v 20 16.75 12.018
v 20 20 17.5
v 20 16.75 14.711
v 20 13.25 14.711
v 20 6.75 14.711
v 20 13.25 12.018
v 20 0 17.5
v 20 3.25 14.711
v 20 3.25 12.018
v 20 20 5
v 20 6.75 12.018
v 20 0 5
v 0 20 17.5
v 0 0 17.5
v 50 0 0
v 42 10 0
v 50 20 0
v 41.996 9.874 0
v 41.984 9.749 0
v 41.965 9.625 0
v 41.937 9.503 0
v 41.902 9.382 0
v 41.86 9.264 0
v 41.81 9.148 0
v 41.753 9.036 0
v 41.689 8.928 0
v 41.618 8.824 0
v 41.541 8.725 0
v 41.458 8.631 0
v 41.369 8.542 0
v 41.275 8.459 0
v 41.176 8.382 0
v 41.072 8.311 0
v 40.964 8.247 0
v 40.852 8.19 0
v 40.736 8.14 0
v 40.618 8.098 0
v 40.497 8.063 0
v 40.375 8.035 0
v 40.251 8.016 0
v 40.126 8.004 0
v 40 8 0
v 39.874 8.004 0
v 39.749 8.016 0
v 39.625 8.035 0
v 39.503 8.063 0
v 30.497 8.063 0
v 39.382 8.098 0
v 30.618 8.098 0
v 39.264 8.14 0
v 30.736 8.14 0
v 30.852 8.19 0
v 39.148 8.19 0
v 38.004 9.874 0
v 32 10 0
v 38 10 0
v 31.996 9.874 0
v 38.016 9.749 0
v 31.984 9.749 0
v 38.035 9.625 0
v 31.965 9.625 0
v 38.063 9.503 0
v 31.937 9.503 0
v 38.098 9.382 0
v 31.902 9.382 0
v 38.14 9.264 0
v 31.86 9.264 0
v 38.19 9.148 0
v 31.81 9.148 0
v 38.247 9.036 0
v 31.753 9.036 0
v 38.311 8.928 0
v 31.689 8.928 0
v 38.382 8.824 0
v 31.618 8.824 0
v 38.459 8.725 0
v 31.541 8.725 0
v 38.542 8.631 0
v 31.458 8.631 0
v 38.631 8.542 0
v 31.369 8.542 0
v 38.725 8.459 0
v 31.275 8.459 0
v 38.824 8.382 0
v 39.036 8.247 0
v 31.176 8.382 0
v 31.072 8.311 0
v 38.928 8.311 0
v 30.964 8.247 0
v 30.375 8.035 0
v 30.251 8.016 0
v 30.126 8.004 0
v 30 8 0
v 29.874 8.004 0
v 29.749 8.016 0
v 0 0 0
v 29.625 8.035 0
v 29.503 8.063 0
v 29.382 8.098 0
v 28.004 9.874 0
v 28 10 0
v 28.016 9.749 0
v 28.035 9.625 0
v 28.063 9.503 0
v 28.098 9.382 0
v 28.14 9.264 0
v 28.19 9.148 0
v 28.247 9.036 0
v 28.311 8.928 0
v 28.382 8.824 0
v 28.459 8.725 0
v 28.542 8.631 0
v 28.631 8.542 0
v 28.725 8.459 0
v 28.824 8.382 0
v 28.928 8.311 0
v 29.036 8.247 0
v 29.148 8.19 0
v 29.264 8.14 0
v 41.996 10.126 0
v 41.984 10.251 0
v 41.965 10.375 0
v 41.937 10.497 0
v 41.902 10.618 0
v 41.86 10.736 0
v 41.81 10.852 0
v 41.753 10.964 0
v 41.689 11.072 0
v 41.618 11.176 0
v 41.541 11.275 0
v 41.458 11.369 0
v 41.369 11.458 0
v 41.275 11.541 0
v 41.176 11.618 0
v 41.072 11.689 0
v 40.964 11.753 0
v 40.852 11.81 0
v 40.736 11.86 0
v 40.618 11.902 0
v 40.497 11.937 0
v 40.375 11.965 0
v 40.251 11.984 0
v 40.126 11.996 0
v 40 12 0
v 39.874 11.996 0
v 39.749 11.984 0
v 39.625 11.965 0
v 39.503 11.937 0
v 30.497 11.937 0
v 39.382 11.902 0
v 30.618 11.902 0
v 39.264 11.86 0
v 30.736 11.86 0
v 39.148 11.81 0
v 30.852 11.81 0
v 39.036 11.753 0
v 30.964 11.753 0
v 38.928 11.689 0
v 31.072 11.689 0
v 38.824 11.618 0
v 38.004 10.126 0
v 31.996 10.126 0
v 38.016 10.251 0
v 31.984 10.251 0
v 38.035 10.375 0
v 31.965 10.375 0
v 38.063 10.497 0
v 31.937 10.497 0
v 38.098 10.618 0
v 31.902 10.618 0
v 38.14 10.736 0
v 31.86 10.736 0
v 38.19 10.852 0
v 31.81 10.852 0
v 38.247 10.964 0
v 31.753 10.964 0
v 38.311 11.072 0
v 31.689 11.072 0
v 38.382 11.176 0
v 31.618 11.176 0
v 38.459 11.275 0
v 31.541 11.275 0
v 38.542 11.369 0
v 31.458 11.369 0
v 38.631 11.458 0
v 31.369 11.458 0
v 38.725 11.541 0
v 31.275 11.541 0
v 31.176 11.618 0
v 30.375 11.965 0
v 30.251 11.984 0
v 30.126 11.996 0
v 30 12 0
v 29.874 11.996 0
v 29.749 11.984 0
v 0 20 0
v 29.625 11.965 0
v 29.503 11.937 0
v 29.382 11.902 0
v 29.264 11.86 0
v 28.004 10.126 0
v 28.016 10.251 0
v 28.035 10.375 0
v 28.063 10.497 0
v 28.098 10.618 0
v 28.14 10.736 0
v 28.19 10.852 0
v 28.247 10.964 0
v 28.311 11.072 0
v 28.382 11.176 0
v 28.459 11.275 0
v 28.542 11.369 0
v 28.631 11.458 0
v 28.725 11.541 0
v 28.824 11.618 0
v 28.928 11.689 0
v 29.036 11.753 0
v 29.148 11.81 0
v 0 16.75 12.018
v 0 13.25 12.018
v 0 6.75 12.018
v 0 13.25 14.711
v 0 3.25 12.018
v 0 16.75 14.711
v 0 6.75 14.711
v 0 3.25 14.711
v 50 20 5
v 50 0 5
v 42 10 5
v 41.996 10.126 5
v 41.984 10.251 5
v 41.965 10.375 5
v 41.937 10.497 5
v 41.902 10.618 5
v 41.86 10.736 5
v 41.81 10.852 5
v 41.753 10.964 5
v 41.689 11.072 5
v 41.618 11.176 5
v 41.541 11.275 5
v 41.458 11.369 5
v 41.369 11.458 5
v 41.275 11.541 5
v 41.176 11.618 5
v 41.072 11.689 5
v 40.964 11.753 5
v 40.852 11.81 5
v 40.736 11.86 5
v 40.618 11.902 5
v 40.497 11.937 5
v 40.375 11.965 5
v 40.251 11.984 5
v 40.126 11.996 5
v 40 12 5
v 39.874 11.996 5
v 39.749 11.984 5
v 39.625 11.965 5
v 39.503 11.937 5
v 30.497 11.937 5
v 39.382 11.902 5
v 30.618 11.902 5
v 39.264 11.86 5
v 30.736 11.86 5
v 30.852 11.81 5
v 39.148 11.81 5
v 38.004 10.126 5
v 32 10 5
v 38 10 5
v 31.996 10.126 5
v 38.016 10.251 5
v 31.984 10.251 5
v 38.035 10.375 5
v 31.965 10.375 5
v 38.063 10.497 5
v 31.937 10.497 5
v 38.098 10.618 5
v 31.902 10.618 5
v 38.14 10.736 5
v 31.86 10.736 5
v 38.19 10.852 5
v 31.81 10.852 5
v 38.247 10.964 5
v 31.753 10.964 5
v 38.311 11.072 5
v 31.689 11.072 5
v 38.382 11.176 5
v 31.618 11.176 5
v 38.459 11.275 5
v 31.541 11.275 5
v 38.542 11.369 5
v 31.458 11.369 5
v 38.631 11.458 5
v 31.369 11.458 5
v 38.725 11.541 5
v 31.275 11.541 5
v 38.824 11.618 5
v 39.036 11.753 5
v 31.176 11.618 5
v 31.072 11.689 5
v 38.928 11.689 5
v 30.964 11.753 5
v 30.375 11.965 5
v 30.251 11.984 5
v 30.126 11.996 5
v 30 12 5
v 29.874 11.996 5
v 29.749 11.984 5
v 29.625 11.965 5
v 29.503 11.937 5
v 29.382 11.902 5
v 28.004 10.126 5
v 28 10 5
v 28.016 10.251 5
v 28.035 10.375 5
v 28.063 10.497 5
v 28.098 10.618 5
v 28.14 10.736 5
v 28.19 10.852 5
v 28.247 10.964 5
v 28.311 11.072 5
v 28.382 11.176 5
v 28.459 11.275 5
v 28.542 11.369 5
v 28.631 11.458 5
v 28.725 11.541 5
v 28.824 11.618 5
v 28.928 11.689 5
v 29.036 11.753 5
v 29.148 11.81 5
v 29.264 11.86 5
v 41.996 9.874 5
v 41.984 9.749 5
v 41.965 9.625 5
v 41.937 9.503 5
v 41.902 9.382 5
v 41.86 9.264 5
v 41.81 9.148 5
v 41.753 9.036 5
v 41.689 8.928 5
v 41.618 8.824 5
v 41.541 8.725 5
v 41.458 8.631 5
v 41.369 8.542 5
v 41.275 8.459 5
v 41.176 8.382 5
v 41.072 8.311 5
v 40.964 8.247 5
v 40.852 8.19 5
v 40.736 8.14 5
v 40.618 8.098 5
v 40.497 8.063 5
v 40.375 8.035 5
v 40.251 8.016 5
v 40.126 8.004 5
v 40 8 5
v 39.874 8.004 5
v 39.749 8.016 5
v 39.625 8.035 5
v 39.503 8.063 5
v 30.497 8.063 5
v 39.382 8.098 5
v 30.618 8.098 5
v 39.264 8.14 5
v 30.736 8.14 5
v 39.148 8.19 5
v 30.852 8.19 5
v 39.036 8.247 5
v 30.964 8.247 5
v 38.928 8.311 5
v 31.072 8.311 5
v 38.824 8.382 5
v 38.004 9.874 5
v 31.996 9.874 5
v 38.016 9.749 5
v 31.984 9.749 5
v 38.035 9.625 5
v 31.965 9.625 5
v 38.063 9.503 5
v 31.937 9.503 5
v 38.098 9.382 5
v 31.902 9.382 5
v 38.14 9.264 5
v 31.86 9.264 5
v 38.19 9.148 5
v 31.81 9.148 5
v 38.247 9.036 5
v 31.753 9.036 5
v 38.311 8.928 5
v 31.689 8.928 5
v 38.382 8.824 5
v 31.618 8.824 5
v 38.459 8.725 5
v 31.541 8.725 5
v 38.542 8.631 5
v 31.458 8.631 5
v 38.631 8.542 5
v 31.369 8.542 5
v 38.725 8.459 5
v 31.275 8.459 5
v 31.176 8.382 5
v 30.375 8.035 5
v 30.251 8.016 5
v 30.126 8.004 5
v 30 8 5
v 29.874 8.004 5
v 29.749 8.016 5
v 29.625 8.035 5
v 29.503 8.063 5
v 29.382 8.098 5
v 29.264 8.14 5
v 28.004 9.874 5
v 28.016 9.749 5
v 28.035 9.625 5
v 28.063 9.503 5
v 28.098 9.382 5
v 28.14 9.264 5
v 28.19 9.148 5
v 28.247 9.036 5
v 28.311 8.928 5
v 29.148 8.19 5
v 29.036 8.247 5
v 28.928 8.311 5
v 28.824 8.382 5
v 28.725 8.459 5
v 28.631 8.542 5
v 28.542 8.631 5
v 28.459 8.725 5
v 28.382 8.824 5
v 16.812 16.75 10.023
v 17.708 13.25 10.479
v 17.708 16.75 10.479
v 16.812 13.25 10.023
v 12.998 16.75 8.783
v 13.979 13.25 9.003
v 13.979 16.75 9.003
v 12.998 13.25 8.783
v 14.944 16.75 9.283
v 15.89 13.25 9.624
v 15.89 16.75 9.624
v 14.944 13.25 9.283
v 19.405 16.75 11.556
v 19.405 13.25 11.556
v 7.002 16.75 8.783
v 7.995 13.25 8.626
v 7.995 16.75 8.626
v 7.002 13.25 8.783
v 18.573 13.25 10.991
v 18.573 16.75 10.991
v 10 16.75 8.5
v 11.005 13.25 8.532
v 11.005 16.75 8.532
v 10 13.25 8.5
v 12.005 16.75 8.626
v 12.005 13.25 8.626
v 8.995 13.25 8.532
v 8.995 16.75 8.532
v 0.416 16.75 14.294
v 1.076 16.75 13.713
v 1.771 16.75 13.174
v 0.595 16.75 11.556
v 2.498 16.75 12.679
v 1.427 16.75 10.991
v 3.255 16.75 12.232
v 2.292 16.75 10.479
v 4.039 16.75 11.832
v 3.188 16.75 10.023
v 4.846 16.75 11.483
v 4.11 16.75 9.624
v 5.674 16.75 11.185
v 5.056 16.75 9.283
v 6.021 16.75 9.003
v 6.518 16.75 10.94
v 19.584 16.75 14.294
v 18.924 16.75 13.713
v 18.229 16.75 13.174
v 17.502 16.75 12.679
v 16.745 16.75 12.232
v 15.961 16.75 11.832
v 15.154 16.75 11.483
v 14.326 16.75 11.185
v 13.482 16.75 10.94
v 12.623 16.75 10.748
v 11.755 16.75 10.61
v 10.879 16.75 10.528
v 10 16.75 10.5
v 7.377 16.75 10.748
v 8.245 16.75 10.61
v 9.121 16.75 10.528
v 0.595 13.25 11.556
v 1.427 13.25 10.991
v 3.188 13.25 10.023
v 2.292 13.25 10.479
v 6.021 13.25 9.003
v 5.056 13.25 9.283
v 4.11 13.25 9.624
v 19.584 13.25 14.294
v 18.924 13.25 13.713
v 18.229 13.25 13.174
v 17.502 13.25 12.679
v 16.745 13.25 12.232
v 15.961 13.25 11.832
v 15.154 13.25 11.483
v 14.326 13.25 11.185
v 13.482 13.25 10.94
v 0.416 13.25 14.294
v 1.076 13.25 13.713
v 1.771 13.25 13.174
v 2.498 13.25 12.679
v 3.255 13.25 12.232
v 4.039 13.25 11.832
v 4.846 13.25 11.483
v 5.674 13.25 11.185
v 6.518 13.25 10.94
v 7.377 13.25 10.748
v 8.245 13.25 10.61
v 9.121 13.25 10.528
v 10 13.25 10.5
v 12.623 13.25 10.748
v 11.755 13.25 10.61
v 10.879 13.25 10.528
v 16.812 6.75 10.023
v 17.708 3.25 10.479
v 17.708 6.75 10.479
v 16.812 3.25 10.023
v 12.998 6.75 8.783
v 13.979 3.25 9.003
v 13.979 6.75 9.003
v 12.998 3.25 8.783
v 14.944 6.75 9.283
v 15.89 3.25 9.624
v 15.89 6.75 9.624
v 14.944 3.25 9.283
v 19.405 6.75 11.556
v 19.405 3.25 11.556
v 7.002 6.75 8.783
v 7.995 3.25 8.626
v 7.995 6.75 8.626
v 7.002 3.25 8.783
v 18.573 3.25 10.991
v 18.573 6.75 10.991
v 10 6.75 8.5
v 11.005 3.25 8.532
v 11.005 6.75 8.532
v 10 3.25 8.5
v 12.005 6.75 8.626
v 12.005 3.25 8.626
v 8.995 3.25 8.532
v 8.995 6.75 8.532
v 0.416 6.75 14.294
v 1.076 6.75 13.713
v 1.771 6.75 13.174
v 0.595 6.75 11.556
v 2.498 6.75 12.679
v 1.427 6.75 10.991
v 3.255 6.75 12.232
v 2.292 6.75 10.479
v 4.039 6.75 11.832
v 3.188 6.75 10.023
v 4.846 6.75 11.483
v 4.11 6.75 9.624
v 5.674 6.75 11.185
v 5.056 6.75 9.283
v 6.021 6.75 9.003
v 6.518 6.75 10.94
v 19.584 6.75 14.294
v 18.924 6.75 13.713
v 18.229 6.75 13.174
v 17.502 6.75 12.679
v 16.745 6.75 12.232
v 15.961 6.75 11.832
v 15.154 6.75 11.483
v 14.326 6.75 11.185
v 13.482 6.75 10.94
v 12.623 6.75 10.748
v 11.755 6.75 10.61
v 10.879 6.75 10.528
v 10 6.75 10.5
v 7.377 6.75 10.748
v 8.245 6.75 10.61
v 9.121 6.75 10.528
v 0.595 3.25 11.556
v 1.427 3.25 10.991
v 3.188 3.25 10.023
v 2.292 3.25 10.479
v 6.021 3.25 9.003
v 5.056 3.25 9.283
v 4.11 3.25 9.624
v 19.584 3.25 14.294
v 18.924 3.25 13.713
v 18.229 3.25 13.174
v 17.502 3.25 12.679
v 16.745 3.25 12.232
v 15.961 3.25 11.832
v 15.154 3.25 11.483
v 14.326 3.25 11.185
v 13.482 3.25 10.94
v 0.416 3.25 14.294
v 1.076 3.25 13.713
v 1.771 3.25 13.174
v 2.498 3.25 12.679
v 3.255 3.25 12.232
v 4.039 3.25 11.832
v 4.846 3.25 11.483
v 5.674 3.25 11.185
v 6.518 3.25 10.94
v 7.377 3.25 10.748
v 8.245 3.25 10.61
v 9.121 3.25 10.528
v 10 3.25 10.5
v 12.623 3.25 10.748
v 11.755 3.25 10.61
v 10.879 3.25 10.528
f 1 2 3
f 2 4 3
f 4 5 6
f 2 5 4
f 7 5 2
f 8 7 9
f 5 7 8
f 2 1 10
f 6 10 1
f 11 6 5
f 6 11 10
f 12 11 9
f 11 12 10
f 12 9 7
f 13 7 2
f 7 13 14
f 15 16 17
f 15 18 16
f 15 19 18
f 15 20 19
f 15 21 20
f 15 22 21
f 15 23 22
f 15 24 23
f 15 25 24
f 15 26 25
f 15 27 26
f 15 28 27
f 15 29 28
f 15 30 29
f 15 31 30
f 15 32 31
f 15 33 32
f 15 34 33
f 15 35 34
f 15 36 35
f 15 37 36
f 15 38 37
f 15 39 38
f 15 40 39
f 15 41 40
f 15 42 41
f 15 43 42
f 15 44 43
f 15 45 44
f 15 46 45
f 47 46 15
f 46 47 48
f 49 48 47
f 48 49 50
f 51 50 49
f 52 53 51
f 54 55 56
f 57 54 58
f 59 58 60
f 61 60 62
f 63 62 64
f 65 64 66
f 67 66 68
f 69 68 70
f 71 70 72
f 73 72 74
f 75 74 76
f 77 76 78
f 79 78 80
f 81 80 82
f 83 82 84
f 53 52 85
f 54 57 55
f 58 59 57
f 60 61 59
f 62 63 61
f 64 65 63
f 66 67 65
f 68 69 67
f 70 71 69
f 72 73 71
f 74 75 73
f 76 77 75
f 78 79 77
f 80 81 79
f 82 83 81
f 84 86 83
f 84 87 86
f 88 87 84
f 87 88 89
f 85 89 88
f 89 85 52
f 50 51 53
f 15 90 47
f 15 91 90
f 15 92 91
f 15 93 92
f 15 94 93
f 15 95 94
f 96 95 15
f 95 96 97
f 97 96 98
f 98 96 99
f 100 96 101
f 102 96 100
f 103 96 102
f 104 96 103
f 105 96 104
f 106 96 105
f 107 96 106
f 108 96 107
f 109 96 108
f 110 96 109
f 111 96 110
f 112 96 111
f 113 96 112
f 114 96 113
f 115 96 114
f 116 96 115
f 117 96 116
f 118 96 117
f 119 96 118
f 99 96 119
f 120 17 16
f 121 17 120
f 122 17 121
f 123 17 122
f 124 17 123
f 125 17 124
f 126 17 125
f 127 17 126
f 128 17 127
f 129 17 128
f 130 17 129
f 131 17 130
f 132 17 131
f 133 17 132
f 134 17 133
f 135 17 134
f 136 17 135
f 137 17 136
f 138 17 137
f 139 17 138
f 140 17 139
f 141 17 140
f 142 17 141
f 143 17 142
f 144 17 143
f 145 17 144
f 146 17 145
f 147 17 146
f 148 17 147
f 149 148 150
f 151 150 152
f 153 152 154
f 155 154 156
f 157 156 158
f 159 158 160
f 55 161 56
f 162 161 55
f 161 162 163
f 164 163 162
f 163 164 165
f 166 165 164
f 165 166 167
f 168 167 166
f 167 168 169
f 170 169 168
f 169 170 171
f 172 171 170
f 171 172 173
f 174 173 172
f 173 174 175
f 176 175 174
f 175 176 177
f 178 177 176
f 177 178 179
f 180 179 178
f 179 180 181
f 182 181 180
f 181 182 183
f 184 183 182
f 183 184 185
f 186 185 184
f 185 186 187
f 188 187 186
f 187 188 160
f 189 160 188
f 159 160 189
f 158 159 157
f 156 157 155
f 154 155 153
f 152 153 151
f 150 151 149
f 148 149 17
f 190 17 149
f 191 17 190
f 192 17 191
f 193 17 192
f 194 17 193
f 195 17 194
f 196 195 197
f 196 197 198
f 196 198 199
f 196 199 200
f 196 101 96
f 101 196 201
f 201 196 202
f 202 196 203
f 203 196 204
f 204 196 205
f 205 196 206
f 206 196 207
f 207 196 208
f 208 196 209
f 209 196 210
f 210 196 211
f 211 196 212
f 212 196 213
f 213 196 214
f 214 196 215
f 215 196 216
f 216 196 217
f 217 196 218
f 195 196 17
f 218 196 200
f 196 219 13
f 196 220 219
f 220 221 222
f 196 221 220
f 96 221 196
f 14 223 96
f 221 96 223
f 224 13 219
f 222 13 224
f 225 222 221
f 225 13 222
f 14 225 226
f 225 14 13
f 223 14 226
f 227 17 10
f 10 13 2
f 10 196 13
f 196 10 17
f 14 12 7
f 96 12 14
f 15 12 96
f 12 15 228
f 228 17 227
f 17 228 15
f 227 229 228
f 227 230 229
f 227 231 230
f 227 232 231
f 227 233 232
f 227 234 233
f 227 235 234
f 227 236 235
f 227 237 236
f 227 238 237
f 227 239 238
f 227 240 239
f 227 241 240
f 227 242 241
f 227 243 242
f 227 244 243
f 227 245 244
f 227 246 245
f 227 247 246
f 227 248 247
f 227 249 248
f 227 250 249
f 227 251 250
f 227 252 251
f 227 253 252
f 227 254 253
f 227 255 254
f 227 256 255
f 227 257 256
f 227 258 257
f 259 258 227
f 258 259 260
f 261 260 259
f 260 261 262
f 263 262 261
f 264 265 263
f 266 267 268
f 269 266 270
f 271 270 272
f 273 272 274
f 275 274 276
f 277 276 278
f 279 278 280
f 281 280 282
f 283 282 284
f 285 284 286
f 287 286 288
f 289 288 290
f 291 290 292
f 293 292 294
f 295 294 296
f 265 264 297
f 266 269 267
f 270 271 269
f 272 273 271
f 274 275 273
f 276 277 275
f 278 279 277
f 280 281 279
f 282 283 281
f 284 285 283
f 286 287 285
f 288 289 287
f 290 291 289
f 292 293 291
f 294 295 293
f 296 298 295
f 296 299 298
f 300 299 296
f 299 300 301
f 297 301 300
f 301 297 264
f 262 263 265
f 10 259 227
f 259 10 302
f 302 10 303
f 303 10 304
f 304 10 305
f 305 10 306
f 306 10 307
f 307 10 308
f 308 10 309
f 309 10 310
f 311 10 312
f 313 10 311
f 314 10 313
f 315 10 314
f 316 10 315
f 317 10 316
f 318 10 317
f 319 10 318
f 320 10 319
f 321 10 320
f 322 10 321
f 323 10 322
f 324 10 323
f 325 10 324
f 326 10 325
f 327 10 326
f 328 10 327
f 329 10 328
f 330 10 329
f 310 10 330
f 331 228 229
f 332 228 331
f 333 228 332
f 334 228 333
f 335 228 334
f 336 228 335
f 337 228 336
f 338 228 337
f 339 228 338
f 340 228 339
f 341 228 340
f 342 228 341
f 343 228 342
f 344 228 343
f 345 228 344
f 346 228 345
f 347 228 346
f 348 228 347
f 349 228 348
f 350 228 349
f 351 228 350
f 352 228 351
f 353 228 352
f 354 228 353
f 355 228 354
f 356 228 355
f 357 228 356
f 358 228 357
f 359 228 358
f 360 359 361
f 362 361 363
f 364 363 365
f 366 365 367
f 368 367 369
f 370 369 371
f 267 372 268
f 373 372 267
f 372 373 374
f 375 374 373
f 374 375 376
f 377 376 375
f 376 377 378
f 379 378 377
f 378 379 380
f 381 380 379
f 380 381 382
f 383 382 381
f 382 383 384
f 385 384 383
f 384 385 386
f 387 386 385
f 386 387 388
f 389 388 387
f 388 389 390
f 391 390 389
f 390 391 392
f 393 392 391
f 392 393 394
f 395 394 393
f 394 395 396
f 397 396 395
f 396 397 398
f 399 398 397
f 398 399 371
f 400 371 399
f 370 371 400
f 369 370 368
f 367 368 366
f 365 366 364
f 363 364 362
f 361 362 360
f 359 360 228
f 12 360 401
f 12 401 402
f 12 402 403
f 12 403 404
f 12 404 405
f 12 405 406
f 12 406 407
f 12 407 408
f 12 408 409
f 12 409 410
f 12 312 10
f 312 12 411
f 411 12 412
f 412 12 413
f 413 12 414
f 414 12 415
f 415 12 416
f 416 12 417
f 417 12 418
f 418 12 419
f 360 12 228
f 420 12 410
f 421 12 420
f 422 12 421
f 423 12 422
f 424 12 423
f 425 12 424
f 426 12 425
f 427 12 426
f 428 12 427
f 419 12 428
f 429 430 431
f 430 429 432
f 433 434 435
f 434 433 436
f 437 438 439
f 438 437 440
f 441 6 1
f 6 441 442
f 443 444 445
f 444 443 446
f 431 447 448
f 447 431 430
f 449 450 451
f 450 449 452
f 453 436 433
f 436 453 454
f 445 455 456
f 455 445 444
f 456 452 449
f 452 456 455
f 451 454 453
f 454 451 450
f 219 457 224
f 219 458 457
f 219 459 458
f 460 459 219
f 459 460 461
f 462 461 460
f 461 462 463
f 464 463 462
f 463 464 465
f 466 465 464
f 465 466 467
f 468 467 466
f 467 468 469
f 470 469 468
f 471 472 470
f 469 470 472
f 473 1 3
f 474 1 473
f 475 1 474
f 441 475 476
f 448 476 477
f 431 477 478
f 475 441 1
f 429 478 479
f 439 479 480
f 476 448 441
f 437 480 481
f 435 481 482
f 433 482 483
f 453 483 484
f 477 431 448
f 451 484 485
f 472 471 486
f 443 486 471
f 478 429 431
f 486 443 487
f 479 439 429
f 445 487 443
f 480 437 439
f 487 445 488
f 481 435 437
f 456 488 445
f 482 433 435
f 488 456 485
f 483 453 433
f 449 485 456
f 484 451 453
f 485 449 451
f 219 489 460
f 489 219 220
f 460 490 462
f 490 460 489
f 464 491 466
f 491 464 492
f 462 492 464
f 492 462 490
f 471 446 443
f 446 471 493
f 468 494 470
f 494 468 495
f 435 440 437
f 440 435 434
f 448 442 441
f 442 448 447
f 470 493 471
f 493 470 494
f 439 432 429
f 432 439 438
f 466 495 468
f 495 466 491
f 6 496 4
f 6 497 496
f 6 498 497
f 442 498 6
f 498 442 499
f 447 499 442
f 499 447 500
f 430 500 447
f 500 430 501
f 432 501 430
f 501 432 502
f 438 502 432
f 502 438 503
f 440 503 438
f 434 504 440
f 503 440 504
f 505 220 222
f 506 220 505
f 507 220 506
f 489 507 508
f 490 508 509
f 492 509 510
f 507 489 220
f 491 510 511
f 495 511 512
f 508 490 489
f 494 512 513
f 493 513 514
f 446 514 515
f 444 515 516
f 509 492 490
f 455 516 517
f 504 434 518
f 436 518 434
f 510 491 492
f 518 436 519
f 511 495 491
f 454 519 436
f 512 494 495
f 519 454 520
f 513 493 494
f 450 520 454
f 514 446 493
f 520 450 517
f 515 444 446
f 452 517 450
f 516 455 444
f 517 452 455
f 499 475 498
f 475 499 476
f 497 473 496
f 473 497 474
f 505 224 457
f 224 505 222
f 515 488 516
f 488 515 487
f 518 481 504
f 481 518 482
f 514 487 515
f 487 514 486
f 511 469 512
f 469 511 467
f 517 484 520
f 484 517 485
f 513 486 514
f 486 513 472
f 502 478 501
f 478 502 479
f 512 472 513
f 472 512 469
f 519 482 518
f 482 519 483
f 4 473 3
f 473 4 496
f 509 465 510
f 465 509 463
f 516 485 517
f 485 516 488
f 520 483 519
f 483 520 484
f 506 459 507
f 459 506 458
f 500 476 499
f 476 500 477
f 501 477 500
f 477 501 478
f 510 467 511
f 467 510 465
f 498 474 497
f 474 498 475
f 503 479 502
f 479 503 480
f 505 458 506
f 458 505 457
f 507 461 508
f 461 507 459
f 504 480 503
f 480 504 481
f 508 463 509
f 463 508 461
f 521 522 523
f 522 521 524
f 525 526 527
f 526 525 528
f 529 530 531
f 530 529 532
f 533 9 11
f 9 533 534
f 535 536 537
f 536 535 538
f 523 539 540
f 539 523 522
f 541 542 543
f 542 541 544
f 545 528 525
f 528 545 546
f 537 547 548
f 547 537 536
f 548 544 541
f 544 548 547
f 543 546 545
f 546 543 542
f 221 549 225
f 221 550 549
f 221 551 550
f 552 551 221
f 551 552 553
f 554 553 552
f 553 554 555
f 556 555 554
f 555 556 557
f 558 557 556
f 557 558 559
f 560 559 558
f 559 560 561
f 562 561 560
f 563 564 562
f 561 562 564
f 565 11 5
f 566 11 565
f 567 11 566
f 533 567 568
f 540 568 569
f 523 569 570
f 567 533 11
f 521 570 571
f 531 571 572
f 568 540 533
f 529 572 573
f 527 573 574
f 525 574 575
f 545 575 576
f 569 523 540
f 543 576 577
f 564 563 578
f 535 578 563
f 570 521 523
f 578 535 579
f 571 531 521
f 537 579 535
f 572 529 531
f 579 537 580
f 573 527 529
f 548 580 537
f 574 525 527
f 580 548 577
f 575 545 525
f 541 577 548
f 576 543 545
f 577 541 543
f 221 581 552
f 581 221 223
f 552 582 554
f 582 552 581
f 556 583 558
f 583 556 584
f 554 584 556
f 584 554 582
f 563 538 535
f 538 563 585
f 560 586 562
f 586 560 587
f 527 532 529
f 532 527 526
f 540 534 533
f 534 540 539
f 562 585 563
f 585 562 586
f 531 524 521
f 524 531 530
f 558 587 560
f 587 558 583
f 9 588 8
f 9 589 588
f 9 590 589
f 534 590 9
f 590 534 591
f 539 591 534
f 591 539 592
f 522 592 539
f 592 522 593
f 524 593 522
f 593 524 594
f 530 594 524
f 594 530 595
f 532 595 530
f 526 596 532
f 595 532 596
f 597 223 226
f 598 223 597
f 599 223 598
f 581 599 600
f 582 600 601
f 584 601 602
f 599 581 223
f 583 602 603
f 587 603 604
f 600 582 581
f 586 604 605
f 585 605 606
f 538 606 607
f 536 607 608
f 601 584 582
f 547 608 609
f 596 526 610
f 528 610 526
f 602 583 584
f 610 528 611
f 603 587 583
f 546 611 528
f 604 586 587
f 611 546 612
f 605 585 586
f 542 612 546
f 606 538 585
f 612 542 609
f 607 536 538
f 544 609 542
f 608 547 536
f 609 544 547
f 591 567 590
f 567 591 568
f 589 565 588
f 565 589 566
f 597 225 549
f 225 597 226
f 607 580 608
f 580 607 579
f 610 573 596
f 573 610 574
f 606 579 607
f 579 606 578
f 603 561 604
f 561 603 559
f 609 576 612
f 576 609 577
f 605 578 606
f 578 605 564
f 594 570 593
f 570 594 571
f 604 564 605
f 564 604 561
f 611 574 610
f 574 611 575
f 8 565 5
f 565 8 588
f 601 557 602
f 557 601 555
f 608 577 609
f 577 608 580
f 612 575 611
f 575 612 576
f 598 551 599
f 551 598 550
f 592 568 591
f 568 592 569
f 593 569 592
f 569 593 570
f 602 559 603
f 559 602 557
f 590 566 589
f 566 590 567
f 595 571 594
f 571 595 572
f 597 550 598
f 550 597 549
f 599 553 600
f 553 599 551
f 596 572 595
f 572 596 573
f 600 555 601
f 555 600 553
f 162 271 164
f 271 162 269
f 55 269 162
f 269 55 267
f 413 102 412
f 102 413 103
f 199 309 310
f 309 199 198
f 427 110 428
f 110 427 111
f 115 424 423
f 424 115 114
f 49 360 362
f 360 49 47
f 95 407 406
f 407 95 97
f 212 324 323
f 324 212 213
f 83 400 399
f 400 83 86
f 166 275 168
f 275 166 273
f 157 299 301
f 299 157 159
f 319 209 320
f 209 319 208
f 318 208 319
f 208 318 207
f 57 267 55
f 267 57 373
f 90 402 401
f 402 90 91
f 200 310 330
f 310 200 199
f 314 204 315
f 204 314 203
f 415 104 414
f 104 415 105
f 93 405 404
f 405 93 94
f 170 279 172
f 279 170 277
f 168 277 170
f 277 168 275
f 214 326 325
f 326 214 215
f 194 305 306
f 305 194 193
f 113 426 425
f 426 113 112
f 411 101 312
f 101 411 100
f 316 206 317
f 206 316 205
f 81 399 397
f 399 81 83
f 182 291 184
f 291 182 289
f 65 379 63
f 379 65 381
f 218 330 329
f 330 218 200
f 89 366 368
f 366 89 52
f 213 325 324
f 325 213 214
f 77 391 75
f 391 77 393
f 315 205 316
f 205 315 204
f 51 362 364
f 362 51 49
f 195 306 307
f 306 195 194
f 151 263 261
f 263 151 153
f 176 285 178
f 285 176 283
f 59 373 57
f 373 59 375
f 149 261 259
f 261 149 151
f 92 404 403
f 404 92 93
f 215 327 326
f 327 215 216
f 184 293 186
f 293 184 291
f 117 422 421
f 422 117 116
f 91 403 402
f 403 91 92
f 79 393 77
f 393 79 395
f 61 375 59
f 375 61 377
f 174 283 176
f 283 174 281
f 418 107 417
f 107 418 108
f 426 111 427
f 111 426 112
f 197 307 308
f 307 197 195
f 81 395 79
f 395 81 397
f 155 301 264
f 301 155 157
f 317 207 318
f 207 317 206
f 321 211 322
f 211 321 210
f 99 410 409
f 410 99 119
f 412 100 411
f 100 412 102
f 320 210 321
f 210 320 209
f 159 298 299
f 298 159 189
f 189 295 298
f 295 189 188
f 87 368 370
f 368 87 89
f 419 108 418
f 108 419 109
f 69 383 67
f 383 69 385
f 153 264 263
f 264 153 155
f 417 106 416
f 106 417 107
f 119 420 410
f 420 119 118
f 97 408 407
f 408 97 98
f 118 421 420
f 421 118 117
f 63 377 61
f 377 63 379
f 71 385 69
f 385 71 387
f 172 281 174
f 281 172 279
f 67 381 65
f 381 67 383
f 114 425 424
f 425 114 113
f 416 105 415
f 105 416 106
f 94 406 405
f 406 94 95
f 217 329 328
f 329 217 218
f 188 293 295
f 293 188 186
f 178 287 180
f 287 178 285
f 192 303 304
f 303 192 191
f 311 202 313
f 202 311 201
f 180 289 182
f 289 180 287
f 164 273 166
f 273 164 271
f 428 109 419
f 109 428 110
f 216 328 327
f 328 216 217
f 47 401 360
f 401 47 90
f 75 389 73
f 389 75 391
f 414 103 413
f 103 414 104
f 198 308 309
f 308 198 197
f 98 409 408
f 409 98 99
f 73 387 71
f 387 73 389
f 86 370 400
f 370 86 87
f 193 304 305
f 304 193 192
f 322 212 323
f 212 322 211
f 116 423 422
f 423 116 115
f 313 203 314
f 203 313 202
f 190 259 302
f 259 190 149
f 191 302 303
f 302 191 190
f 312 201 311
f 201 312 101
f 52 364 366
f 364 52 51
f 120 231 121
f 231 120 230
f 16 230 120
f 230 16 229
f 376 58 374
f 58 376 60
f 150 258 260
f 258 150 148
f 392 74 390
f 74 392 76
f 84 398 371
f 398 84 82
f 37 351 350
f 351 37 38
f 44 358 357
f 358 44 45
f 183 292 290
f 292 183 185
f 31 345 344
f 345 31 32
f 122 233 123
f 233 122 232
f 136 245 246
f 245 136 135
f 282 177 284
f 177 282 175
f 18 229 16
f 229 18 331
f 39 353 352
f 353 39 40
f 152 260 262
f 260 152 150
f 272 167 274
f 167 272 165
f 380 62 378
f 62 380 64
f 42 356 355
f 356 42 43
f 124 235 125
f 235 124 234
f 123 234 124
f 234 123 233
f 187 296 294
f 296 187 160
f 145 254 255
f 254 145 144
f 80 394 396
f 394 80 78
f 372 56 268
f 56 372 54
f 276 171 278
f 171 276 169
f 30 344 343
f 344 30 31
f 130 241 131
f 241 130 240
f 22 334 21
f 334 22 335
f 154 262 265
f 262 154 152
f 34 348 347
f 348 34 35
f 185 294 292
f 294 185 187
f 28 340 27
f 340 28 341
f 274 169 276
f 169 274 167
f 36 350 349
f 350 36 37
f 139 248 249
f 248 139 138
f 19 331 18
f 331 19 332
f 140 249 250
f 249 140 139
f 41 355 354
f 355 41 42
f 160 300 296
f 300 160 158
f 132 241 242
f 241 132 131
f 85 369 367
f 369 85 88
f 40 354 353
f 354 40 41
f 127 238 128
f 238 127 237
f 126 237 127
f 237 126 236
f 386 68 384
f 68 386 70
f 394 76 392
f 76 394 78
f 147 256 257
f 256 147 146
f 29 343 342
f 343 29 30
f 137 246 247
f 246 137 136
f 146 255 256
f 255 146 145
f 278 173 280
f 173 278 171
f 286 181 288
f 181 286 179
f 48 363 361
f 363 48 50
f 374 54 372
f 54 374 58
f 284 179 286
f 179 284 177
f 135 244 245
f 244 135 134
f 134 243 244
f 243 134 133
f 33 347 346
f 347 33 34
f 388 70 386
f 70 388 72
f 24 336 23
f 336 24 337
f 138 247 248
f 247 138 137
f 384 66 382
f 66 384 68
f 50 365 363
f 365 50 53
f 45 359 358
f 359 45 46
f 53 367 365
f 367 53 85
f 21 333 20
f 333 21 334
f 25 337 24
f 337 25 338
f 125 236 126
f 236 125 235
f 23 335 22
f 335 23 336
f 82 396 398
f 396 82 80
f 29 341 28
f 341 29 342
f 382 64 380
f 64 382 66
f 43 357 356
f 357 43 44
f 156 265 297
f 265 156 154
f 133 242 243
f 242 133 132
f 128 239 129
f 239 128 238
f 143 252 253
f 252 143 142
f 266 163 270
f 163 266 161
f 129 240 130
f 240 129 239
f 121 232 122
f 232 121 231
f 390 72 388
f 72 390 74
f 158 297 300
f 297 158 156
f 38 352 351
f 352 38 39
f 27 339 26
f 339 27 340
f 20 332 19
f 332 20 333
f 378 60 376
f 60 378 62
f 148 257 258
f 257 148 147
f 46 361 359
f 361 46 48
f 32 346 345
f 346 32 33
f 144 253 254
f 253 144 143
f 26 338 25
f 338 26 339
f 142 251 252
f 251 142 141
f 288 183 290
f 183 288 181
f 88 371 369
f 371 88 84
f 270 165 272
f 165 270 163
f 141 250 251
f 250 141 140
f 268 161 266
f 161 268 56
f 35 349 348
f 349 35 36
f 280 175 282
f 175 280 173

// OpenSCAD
//=================================================//
// filastruder_toroidal_duct_mounting_bracket.scad //
//=================================================//
// Designed by Kyle Seigler and released under the //
// MIT license, available at:					   //
// https://opensource.org/licenses/MIT    		   //
//=================================================//

/*The MIT License (MIT)

Copyright (c) 2016 Kyle Seigler

Permission is hereby granted, free of charge, to any person obtaining a copy of this software and associated documentation files (the "Software"), to deal in the Software without restriction, including without limitation the rights to use, copy, modify, merge, publish, distribute, sublicense, and/or sell copies of the Software, and to permit persons to whom the Software is furnished to do so, subject to the following conditions:

The above copyright notice and this permission notice shall be included in all copies or substantial portions of the Software.

THE SOFTWARE IS PROVIDED "AS IS", WITHOUT WARRANTY OF ANY KIND, EXPRESS OR IMPLIED, INCLUDING BUT NOT LIMITED TO THE WARRANTIES OF MERCHANTABILITY, FITNESS FOR A PARTICULAR PURPOSE AND NONINFRINGEMENT. IN NO EVENT SHALL THE AUTHORS OR COPYRIGHT HOLDERS BE LIABLE FOR ANY CLAIM, DAMAGES OR OTHER LIABILITY, WHETHER IN AN ACTION OF CONTRACT, TORT OR OTHERWISE, ARISING FROM, OUT OF OR IN CONNECTION WITH THE SOFTWARE OR THE USE OR OTHER DEALINGS IN THE SOFTWARE.
*/

// all dimensions in mm
// designed for M5 bolts and M5 nuts

$fn=100; // 200 default

// Dimensional settings (all measurements in mm)
// WARNING: Some of these scale, some don't (this is a WIP).
// Default values in comments--these should work properly.

ductRadius=                     8;              // 16mm diameter
spacerHeight=                   12.5;           // 10mm default
zipTieCylinderRadius=           ductRadius+4;   // ductRadius+4 default
toroidOuter=			8;		// 8 default
toroidRadius=			30;		// 25 default (this is the rotational width)
elbowRadius=                    45;		// toroidRadius default

// Complete object
difference(){
  spacer();
  // connecting tube here?
  translate([0,5,0]){
    zipTieHole();
  }
  translate([0,-5,0]){
    zipTieHole();
  }
  fastenerHole();
}

// Modules
module fastenerHole(){
  translate([30,10,2.5]){
    cylinder(center=true,h=5.01,r=2);
  }
  translate([40,10,2.5]){
    cylinder(center=true,h=5.01,r=2);
  }
}
module screwHole(){
  union(){
    translate([0,0,0]){
      cylinder(center=true,h=20.01,r=3);
    }
    translate([0,0,0]){
      cylinder(center=true,h=20.01,r=3);
    }
  }
}
module zipTieHole(){
  translate([10,10,spacerHeight+zipTieCylinderRadius]){
    rotate([90,0,0]){
      difference(){
        cylinder(center=true,h=3.5,r=zipTieCylinderRadius+4);
        cylinder(center=true,h=3.6,r=zipTieCylinderRadius+2);
      }
    }
  }
}
module ductRecess(){
  translate([10,10,spacerHeight+ductRadius]){
    rotate([90,0,0]){
      cylinder(center=true,h=20.01,r=8);
    }
  }
}
module spacer(){
  union(){
    translate([0,0,0]){
      cube(center=false,[20,20,spacerHeight+5]);
    }
    translate([0,0,0]){
      cube(center=false,[50,20,5]);
    }
  }
}
